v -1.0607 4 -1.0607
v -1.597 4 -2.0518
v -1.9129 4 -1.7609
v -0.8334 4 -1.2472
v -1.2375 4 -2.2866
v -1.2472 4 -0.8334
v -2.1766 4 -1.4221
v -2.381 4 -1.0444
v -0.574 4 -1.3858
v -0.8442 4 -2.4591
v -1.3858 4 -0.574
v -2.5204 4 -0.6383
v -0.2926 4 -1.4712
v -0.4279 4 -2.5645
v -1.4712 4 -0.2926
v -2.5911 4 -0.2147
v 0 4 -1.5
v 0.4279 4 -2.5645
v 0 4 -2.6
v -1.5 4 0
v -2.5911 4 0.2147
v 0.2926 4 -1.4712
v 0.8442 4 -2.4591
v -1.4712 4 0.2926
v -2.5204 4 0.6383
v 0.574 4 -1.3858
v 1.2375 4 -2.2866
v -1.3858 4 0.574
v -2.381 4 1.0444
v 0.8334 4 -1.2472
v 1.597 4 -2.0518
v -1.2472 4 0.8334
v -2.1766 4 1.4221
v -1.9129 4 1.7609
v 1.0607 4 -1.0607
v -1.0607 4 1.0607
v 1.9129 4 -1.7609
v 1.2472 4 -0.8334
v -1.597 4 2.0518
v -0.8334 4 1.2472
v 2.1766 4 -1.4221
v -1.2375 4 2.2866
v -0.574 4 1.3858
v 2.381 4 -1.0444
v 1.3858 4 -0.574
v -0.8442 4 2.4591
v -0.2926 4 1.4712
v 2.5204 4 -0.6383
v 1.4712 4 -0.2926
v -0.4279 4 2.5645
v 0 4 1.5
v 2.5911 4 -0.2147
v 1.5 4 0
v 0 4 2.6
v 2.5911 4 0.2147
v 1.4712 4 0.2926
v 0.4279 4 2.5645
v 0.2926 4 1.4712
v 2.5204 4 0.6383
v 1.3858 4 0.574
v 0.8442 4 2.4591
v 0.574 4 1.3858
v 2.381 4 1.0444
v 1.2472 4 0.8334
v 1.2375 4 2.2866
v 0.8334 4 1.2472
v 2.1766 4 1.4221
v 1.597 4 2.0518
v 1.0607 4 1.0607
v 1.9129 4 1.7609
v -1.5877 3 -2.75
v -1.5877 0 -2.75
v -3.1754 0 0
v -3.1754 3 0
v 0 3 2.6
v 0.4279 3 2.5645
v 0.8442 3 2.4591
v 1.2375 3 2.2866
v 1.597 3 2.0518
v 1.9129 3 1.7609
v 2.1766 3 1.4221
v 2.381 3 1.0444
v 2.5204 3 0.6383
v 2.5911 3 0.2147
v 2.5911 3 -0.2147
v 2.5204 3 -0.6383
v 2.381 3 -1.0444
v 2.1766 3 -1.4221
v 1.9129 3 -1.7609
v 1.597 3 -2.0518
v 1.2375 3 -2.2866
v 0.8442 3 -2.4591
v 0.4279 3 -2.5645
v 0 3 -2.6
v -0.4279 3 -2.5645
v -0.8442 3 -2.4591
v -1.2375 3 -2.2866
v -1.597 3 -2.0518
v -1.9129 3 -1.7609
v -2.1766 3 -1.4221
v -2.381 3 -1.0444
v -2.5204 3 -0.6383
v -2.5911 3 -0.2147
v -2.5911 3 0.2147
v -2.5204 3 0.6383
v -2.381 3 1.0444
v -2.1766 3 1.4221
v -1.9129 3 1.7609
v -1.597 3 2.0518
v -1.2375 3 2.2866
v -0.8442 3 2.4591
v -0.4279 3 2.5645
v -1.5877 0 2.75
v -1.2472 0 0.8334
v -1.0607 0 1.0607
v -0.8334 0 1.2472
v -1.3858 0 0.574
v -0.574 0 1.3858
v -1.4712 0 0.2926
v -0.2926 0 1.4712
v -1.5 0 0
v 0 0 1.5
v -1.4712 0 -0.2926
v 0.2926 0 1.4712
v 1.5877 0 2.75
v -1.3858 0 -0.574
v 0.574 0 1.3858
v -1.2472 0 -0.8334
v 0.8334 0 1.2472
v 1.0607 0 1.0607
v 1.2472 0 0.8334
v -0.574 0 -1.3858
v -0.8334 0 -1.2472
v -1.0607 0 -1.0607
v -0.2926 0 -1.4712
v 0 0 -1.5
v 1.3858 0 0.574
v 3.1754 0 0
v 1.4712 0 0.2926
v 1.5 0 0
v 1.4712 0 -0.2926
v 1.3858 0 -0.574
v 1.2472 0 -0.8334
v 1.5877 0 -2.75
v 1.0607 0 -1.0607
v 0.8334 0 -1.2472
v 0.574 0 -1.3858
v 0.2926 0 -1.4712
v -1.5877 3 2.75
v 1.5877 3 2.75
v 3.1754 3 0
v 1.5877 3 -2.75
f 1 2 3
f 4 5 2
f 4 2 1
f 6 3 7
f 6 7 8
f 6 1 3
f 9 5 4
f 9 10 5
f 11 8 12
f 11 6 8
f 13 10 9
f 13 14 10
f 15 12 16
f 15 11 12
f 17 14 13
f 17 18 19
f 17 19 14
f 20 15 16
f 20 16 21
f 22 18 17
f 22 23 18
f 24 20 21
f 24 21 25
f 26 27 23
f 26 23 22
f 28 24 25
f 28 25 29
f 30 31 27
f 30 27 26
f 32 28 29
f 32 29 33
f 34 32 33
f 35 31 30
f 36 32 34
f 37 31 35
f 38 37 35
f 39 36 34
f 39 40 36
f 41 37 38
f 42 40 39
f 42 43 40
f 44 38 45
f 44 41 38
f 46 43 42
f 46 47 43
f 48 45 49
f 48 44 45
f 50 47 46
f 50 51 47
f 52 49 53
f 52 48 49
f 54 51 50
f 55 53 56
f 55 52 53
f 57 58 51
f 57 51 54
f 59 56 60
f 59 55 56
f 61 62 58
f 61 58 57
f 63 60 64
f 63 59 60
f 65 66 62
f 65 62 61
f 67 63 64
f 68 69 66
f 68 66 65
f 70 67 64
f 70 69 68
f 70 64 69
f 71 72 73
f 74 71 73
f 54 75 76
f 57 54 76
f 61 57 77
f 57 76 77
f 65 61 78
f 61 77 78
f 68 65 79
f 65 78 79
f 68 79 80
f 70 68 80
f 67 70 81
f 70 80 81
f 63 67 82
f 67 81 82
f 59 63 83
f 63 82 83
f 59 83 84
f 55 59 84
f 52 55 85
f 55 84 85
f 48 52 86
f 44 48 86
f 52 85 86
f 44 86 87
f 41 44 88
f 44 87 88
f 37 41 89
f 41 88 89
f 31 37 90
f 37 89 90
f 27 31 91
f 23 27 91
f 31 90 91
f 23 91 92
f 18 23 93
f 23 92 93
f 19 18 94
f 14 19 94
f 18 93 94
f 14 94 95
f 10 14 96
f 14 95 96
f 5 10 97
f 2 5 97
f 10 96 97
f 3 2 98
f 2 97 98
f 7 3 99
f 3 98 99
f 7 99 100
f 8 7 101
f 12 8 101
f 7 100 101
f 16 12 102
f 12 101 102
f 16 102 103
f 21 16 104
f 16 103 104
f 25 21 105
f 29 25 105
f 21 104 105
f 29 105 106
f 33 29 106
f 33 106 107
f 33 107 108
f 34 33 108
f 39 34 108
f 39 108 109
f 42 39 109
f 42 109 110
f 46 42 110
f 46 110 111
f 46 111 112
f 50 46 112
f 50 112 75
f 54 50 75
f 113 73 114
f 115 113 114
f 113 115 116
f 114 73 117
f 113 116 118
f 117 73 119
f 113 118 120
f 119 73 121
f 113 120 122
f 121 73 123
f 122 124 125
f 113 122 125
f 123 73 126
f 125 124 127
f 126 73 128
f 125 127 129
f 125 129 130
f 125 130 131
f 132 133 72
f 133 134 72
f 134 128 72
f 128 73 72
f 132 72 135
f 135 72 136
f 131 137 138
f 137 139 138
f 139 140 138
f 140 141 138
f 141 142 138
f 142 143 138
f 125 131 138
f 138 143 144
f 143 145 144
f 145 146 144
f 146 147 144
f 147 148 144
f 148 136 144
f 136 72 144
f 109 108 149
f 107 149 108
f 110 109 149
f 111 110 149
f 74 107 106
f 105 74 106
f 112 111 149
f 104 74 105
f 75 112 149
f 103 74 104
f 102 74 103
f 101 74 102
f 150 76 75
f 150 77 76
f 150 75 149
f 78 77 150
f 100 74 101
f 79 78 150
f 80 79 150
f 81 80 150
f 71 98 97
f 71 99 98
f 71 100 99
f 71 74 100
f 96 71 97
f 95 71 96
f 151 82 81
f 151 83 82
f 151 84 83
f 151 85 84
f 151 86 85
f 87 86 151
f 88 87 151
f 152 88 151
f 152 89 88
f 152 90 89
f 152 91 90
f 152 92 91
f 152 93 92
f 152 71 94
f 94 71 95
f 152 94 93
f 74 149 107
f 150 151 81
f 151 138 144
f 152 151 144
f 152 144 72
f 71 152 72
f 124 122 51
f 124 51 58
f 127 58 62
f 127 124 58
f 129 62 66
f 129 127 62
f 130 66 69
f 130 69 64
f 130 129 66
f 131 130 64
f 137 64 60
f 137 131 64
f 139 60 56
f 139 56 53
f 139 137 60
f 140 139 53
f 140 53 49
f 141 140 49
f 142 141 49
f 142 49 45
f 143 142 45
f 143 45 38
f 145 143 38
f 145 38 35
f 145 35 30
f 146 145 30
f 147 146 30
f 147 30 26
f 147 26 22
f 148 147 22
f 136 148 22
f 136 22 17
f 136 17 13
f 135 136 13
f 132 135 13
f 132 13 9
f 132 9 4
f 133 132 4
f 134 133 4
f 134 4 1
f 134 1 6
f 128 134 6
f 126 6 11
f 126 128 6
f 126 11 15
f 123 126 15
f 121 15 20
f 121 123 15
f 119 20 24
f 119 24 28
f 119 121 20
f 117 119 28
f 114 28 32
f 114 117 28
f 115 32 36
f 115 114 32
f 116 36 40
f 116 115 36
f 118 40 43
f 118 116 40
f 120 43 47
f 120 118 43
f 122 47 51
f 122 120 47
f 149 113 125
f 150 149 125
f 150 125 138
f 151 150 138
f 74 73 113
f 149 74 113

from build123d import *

# Parameters (mm, degrees)
BOSS_EXTRU_1_DEPTH      = 3
BOSS_EXTRU_2_START      = 3
ESQUISSE2_R             = 2.6
ESQUISSE2_R_2           = 1.5
BOSS_EXTRU_2_DEPTH      = 1
ESQUISSE3_R             = 1.5
ENL_V_MAT_EXTRU_1_DEPTH = 6.800502852


with BuildPart() as part:
    # Esquisse1 → Boss.-Extru.1 (new body)
    with BuildSketch(Plane(origin=(0, 0, 0), x_dir=(1, 0, 0), z_dir=(0, 1, 0))):
        Polygon((3.175426481, 0), (1.58771324, 2.75), (-1.58771324, 2.75), (-3.175426481, 0), (-1.58771324, -2.75), (1.58771324, -2.75), align=None)
    extrude(amount=BOSS_EXTRU_1_DEPTH)

    # Esquisse2 → Boss.-Extru.2 (add)
    with BuildSketch(Plane(origin=(0, 0, 0), x_dir=(1, 0, 0), z_dir=(0, 1, 0)).offset(BOSS_EXTRU_2_START)):
        with Locations(Location((0, 0, 0), (0, 0, 270))):
            Circle(ESQUISSE2_R)
        with Locations(Location((0, 0, 0), (0, 0, 270))):
            Circle(ESQUISSE2_R_2, mode=Mode.SUBTRACT)
    extrude(amount=BOSS_EXTRU_2_DEPTH)

    # Esquisse3 → Enlèv. mat.-Extru.1 (cut, through all)
    with BuildSketch(Plane(origin=(0, 0, 0), x_dir=(1, 0, 0), z_dir=(0, 1, 0))):
        with Locations(Location((0, 0, 0), (0, 0, 270))):
            Circle(ESQUISSE3_R)
    extrude(amount=ENL_V_MAT_EXTRU_1_DEPTH, mode=Mode.SUBTRACT)


solid = part.part
